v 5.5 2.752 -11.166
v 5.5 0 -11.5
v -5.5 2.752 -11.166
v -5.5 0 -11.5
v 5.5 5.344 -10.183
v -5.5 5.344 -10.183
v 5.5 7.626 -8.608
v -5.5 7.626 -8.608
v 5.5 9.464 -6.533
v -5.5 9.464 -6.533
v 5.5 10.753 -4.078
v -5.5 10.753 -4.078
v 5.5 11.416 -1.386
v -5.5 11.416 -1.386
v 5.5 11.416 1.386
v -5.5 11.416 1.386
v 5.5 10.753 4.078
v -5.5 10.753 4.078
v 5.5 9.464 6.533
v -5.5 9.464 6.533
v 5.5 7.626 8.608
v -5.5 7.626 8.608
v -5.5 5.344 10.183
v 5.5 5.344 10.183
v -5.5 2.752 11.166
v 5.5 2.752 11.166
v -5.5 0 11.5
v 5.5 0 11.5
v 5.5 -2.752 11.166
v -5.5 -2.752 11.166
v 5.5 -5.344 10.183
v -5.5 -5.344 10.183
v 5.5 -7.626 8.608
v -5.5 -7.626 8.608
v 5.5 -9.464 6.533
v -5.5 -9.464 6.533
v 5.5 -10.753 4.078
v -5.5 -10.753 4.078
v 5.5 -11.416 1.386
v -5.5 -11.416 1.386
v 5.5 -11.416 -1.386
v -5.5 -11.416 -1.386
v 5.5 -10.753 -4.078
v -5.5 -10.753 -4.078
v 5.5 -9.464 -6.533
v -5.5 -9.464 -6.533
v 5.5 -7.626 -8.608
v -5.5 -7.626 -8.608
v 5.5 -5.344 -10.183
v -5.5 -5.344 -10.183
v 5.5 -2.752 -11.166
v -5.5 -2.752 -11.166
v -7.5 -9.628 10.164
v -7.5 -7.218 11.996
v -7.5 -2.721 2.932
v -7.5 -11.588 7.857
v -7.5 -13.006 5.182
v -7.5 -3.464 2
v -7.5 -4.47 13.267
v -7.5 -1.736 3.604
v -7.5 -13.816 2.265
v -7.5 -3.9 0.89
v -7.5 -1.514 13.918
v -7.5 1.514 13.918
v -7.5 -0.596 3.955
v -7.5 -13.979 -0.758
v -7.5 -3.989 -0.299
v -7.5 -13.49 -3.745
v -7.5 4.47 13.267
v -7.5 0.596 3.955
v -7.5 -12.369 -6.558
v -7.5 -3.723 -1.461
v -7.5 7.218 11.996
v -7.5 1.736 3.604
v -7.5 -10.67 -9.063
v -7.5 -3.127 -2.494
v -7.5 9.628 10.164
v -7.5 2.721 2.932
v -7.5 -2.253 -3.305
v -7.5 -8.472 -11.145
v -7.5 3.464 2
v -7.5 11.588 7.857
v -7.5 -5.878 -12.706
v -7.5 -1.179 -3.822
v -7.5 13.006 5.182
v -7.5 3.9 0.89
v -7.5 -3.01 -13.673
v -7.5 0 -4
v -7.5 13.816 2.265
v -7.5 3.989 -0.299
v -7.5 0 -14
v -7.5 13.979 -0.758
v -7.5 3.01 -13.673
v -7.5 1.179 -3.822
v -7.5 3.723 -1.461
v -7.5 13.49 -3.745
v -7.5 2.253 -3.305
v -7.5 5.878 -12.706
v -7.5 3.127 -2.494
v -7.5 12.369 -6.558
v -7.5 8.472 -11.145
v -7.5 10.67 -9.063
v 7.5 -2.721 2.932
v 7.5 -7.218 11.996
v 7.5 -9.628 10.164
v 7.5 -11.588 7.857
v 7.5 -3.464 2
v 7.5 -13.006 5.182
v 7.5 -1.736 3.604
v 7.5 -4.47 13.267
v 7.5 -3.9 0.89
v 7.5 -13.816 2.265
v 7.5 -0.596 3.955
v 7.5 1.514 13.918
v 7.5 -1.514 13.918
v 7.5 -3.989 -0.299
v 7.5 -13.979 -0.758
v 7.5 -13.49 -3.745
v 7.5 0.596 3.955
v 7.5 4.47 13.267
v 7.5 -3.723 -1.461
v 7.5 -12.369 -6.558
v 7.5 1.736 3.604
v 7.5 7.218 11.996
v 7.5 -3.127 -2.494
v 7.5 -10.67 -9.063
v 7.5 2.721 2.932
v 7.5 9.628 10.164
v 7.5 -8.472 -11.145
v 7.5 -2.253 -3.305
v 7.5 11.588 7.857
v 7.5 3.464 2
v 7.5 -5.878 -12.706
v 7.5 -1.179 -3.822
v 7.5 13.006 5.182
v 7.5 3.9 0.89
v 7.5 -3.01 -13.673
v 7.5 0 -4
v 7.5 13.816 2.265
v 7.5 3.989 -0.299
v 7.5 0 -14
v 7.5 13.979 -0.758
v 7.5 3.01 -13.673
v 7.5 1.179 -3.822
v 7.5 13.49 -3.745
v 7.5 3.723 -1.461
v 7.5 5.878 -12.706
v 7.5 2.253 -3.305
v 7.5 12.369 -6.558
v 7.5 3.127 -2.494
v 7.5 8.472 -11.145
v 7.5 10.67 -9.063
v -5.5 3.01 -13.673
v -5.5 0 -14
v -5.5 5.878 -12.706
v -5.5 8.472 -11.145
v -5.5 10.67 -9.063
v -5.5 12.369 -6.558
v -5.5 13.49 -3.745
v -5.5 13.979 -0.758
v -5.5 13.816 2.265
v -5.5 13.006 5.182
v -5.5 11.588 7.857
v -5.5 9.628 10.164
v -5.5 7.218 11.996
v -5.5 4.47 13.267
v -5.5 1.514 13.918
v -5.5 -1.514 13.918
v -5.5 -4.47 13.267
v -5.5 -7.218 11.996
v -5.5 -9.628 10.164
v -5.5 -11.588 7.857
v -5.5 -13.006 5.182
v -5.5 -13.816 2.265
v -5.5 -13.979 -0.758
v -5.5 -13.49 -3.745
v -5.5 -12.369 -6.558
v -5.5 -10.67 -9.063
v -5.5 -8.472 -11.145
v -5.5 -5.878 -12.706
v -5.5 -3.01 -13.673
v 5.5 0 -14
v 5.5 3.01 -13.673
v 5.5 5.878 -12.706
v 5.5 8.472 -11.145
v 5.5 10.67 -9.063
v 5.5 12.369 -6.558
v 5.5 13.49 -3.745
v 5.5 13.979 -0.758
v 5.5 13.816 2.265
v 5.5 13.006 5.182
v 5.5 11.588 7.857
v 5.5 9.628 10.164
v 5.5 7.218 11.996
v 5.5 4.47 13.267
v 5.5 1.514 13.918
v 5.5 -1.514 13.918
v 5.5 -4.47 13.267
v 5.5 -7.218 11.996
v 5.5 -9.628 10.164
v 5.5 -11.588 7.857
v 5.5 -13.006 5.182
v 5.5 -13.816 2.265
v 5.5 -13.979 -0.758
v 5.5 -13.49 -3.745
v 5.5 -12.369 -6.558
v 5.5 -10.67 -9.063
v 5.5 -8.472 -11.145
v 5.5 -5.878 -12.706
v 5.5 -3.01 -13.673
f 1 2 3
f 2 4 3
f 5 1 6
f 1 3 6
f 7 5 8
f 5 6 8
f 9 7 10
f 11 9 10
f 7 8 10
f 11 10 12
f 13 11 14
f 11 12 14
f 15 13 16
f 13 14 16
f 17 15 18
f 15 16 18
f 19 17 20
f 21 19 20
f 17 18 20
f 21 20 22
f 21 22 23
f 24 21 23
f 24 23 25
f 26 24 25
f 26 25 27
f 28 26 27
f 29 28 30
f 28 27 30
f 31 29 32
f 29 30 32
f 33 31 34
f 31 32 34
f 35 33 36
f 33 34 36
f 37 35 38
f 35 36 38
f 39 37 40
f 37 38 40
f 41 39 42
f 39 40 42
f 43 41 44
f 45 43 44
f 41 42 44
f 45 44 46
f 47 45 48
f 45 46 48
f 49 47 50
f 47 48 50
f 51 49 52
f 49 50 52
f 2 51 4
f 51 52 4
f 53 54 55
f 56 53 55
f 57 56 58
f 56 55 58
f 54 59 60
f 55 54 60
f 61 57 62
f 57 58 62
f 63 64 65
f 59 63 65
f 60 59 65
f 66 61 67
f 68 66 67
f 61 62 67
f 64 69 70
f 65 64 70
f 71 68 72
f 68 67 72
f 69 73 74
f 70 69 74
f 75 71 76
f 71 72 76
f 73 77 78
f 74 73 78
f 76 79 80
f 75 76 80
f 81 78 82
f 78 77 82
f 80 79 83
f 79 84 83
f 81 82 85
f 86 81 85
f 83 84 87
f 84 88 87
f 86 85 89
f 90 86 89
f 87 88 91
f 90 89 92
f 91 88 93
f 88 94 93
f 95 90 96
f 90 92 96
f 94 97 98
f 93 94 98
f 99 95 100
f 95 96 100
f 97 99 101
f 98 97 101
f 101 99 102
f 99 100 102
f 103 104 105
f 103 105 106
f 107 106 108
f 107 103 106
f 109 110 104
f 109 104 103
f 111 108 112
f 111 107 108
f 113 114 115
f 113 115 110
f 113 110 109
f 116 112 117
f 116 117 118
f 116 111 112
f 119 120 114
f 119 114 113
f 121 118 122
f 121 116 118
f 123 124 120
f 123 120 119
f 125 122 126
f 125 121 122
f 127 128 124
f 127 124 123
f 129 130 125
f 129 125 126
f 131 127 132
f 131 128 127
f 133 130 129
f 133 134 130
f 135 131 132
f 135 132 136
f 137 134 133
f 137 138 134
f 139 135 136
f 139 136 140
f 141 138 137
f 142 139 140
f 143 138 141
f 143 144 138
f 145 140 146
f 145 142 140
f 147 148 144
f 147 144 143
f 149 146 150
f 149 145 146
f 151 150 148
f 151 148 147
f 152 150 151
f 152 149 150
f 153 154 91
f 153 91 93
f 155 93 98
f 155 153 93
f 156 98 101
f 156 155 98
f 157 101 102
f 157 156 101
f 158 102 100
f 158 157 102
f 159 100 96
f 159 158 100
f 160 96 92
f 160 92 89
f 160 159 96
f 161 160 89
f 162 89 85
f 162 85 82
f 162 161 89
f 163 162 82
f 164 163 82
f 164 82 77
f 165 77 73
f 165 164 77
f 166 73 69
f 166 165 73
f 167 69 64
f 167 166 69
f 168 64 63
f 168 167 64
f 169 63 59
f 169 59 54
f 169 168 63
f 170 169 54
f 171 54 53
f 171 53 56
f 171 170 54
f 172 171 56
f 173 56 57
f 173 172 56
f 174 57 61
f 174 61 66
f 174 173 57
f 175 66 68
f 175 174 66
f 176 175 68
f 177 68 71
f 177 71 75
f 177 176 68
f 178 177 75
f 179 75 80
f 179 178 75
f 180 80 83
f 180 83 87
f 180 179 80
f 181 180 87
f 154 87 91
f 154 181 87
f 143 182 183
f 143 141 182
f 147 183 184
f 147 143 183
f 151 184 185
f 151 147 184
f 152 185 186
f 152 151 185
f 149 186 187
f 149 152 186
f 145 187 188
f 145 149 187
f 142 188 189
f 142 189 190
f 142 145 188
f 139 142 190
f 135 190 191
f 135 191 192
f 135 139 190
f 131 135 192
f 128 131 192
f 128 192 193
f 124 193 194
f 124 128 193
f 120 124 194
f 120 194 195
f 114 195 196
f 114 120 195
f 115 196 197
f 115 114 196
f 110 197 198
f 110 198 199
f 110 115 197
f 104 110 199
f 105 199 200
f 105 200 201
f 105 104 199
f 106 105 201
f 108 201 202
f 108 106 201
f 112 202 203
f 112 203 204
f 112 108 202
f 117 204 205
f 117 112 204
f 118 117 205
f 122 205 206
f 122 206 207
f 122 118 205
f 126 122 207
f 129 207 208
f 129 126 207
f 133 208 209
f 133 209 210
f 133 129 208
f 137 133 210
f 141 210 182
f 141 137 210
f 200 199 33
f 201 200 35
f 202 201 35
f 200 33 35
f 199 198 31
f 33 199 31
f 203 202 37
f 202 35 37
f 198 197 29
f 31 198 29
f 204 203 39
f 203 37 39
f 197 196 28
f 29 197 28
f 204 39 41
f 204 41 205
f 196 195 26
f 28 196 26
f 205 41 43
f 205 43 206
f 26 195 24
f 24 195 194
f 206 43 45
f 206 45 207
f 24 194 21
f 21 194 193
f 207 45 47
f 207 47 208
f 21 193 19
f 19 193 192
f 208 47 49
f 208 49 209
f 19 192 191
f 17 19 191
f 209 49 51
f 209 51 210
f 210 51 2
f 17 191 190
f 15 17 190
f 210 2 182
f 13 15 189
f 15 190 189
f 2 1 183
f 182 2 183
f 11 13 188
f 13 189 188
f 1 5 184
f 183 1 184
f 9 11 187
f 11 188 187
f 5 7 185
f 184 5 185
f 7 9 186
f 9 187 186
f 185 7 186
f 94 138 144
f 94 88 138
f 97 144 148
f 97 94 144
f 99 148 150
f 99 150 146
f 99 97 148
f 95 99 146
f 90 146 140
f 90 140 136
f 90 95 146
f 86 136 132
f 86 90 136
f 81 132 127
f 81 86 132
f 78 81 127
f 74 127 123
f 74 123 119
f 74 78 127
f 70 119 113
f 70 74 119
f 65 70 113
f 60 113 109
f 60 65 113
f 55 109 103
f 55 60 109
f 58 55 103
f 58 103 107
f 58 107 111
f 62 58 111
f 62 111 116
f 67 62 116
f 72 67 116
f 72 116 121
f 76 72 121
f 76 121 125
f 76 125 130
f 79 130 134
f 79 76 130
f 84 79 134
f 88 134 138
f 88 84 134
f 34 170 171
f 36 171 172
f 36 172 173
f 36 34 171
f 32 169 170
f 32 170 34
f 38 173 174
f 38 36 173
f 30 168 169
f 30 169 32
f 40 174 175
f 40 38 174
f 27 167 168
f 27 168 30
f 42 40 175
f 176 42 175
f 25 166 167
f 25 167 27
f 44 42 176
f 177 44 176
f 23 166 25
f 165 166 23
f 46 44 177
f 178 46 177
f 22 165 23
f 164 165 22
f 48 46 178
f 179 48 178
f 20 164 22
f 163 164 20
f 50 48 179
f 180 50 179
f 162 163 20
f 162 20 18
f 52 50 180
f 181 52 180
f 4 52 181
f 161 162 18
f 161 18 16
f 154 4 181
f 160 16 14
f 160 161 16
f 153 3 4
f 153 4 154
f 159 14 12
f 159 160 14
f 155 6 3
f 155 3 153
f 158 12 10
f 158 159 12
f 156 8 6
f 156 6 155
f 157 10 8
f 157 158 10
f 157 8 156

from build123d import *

# Parameters (mm, degrees)
SKETCH1_R           = 14
SKETCH1_R_2         = 4
BOSS_EXTRUDE1_DEPTH = 7.5
SKETCH2_OUTSIDE_W   = 38.468
SKETCH2_OUTSIDE_H   = 38.468
SKETCH2_OUTSIDE_R   = 11.5
CUT_EXTRUDE1_DEPTH  = 5.5


with BuildPart() as part:
    # Sketch1 → Boss-Extrude1 (new, symmetric)
    with BuildSketch(Plane(origin=(0, 0, 0), x_dir=(0, 0, -1), z_dir=(1, 0, 0))):
        Circle(SKETCH1_R)
        Circle(SKETCH1_R_2, mode=Mode.SUBTRACT)
    extrude(amount=BOSS_EXTRUDE1_DEPTH, both=True)

    # Sketch2 outside → Cut-Extrude1 (cut, symmetric)
    with BuildSketch(Plane(origin=(0, 0, 0), x_dir=(0, 0, -1), z_dir=(1, 0, 0))):
        Rectangle(SKETCH2_OUTSIDE_W, SKETCH2_OUTSIDE_H)
        Circle(SKETCH2_OUTSIDE_R, mode=Mode.SUBTRACT)
    extrude(amount=CUT_EXTRUDE1_DEPTH, both=True, mode=Mode.SUBTRACT)


solid = part.part
